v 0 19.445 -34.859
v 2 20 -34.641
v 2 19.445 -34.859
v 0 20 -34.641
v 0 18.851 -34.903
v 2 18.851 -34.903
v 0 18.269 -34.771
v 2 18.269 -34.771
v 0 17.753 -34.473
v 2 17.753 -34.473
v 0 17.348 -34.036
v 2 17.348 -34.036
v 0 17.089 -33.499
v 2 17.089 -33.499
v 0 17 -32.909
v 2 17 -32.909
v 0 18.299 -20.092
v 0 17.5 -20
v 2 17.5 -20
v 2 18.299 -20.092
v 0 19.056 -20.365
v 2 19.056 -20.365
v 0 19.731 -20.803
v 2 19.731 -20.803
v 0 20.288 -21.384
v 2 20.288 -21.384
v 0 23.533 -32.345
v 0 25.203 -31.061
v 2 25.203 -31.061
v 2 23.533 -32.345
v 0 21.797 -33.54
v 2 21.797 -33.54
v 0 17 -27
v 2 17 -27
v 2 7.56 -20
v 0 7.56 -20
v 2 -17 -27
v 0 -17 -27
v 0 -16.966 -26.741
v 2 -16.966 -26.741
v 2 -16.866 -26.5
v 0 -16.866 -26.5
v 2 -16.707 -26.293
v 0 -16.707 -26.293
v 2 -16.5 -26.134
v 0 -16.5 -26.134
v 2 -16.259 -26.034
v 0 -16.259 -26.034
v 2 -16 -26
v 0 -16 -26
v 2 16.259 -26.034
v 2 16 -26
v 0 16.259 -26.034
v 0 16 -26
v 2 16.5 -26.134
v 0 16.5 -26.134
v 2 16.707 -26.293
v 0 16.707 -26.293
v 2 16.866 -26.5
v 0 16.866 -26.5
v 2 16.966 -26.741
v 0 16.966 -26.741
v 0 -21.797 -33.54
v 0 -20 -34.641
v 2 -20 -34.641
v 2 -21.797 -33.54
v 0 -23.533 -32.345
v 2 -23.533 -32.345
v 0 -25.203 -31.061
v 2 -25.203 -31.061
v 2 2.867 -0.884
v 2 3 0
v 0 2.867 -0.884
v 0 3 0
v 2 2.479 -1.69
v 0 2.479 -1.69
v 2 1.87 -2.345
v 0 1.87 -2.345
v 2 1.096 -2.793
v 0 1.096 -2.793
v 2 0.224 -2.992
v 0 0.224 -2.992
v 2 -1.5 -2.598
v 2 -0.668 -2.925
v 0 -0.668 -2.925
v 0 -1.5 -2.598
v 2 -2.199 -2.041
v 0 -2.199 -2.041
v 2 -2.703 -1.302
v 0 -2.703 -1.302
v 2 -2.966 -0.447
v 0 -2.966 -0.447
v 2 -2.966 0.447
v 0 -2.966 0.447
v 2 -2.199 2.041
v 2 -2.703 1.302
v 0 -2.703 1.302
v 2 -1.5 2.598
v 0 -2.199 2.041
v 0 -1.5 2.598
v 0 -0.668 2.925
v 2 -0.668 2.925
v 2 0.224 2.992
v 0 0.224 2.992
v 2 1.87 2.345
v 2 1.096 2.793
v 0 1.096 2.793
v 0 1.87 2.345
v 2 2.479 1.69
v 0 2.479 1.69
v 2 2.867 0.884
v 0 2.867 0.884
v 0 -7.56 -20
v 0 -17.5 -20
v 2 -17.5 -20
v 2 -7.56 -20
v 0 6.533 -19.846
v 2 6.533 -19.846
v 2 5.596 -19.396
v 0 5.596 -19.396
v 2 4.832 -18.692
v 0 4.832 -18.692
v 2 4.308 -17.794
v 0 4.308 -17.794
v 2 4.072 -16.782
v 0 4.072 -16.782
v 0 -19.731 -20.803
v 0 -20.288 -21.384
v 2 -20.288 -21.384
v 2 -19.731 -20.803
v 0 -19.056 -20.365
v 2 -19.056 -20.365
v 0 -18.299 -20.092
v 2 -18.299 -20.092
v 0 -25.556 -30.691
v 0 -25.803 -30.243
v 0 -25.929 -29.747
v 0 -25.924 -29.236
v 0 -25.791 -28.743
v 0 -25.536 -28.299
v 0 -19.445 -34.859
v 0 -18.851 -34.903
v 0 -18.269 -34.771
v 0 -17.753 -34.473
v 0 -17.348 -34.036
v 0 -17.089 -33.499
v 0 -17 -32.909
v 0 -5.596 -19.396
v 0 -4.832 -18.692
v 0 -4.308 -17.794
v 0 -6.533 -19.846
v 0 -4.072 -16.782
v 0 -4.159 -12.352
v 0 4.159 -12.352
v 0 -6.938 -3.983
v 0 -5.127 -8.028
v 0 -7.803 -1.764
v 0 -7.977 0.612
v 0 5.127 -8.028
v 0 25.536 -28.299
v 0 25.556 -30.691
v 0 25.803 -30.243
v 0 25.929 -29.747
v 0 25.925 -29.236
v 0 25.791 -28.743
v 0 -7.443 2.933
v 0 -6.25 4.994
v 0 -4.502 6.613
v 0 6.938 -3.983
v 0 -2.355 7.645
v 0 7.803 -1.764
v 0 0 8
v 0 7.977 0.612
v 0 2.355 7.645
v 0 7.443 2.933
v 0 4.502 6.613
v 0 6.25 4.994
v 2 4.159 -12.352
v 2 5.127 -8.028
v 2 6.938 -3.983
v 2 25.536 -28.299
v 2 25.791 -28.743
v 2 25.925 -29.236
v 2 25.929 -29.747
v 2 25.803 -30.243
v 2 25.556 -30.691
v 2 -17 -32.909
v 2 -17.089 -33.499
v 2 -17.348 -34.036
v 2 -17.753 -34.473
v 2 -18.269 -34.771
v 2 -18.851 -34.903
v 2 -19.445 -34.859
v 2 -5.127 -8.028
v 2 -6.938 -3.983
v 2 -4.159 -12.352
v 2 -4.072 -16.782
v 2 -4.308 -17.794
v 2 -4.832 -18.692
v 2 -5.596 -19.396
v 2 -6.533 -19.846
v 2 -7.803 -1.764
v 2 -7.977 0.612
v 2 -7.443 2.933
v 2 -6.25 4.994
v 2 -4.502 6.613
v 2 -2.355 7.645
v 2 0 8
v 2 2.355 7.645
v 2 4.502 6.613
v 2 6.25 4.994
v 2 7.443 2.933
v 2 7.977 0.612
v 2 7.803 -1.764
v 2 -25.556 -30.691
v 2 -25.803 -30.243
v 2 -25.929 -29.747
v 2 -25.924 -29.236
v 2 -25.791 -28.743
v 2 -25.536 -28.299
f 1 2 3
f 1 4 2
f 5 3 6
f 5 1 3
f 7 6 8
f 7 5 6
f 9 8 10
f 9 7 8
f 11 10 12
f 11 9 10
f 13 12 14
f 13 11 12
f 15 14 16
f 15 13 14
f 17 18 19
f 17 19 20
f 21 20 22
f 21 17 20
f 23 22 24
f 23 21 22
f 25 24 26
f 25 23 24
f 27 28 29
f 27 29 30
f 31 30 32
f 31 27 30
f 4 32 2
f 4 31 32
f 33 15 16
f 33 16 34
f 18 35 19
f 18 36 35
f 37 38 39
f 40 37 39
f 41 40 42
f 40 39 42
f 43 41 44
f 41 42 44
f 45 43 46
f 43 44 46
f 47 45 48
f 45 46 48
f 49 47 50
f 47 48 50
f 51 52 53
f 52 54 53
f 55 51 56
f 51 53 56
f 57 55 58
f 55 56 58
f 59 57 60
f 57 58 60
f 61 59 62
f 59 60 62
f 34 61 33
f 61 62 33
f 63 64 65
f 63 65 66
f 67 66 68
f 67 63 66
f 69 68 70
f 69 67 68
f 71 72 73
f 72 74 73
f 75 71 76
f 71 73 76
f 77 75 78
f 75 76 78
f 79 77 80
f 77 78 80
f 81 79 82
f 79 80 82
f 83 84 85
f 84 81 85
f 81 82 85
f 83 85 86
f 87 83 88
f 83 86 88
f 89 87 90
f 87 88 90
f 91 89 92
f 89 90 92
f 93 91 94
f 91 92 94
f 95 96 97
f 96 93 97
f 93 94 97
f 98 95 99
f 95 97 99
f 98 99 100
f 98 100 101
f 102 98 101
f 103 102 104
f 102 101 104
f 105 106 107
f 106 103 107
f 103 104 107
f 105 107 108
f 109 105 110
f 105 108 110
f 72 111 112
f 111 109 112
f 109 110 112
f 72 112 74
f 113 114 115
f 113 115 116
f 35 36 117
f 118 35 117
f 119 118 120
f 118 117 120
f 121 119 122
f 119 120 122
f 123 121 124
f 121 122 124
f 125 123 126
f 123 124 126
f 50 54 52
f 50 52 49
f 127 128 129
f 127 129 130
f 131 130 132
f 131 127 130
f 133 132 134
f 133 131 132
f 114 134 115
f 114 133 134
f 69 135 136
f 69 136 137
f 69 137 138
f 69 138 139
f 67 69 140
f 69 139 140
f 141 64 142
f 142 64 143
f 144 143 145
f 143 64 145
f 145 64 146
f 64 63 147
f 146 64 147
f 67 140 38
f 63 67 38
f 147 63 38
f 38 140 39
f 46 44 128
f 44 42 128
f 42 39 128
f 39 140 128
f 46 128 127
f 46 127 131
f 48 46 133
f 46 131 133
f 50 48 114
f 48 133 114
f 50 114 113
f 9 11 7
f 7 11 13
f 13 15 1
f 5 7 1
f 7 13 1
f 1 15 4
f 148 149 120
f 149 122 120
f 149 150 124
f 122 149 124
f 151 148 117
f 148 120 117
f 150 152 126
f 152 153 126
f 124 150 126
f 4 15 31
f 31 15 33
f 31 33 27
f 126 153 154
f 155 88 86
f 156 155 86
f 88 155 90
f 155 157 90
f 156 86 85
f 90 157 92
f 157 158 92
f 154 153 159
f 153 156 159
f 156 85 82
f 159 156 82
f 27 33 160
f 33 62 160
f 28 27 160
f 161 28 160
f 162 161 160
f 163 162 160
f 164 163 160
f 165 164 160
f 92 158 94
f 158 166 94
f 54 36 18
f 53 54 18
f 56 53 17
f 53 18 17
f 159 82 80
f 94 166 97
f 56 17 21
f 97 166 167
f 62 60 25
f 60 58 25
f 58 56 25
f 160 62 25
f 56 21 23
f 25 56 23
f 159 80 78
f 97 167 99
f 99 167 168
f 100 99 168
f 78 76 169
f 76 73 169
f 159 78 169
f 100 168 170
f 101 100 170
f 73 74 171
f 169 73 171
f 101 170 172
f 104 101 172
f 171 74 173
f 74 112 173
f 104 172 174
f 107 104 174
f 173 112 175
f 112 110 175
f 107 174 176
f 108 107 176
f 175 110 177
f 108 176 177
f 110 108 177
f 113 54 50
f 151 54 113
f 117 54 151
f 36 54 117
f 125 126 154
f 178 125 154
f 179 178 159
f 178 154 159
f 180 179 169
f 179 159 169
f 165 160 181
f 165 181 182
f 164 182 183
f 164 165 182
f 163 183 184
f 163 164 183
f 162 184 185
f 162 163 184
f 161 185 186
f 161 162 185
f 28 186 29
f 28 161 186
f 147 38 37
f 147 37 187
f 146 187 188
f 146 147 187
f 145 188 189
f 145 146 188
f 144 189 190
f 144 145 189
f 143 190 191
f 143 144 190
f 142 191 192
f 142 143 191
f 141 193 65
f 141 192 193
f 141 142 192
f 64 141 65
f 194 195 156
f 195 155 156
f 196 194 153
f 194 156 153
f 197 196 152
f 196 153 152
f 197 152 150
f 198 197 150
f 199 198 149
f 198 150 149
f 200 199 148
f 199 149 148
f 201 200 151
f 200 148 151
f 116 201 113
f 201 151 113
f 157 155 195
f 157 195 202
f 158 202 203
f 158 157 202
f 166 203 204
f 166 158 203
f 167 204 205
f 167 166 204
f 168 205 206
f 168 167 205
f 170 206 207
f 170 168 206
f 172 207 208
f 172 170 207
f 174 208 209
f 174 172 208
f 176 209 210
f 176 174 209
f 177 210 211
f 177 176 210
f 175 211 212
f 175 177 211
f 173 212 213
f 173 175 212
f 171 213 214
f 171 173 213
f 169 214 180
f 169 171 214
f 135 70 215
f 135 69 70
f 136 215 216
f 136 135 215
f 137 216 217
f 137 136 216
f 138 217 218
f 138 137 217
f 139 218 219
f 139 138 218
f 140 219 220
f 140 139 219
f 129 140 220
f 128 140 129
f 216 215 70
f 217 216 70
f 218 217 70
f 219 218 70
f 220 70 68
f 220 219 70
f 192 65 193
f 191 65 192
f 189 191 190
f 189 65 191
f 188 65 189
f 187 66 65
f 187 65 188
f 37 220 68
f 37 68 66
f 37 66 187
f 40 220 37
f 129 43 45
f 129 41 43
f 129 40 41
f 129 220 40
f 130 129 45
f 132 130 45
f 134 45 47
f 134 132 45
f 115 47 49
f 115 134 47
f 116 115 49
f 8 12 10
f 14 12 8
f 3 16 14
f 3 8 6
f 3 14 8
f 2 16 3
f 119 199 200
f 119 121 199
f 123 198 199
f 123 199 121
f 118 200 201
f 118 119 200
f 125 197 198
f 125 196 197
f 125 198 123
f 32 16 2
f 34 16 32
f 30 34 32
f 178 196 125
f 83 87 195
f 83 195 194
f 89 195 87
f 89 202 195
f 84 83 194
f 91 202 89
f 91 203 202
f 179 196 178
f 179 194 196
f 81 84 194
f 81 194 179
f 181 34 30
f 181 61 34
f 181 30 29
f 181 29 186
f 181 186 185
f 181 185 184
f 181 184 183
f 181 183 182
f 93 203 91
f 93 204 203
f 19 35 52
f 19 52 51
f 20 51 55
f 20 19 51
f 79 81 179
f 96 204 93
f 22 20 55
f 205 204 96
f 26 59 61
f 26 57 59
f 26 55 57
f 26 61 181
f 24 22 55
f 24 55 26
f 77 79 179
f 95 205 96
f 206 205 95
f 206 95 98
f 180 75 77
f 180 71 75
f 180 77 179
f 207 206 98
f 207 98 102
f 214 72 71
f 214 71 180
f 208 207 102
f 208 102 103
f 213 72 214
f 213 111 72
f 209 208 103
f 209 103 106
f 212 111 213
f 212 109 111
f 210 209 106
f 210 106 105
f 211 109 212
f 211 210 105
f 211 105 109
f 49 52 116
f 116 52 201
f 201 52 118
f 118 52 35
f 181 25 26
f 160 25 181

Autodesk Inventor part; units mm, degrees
ref_plane "YZ Plane" through (0, 0, 0) normal (1, 0, 0) x (0, 1, 0)
ref_plane "XZ Plane" through (0, 0, 0) normal (0, 1, 0) x (-1, 0, 0)
ref_plane "XY Plane" through (0, 0, 0) normal (0, 0, 1) x (1, 0, 0)
sketch "スケッチ1" plane through (0, 0, 0) normal (1, 0, 0) x (0, 1, 0)
  circle A0 centre (0, 0) radius 3
  circle A1 centre (0, 0) radius 5 construction
  arc A2 (6.9378, -3.9834) -> (-6.9378, -3.9834) centre (0, 0) ccw
  arc A3 (6.9378, -3.9834) -> (4.0719, -16.7819) centre (26.125, -15) ccw
  arc A4 (-4.0719, -16.7819) -> (-6.9378, -3.9834) centre (-26.125, -15) ccw
  arc A5 (4.0719, -16.7819) -> (7.5605, -20) centre (7.5605, -16.5) ccw
  arc A6 (-7.5605, -20) -> (-4.0719, -16.7819) centre (-7.5605, -16.5) ccw
  line L0 (7.5605, -20) -> (17.5, -20)
  line L1 (20.2879, -21.384) -> (25.5362, -28.299)
  line L2 (17, -32.909) -> (17, -27)
  line L3 (16, -26) -> (-16, -26)
  line L4 (-17, -27) -> (-17, -32.909)
  line L5 (-25.5362, -28.299) -> (-20.2879, -21.384)
  line L6 (-17.5, -20) -> (-7.5605, -20)
  arc A7 (-25.2033, -31.0612) -> (-20, -34.641) centre (0, 0) ccw
  arc A8 (20, -34.641) -> (25.2033, -31.0612) centre (0, 0) ccw
  arc A9 (25.2033, -31.0612) -> (25.5362, -28.299) centre (23.9431, -29.5081) ccw
  arc A10 (17, -32.909) -> (20, -34.641) centre (19, -32.909) ccw
  arc A11 (-20, -34.641) -> (-17, -32.909) centre (-19, -32.909) ccw
  arc A12 (-25.5362, -28.299) -> (-25.2033, -31.0612) centre (-23.9431, -29.5081) ccw
  arc A13 (-17.5, -20) -> (-20.2879, -21.384) centre (-17.5, -23.5) ccw
  arc A14 (20.2879, -21.384) -> (17.5, -20) centre (17.5, -23.5) ccw
  line L7 (0, 0) -> (0, -40) construction
  arc A15 (-20, -34.641) -> (20, -34.641) centre (0, 0) ccw construction
  arc A16 (17, -27) -> (16, -26) centre (16, -27) ccw
  arc A17 (-16, -26) -> (-17, -27) centre (-16, -27) ccw
  line L8 (4, 0) -> (4, -38.6169) construction
  line L9 (26.125, -15) -> (-26.125, -15) construction
  point P0 (26.6783, -29.8038)
  point P1 (17, -36.2077)
  point P2 (-17, -36.2077)
  point P3 (-26.6783, -29.8038)
  dimension "d0" = 10
  dimension "d1" = 2
  dimension "d2" = 3.5
  dimension "d4" = 1
  dimension "d5" = 8
  dimension "d6" = 6
  dimension "d7" = 8
  dimension "d8" = 26
  dimension "d9" = 6
  dimension "d10" = 6
  dimension "d11" = 34
  dimension "d12" = 15
  dimension "d13" = 35
  dimension "d16" = 14
extrude "押し出し1" add sketch "スケッチ1" along normal blind 2
properties part number "camera_stay"
